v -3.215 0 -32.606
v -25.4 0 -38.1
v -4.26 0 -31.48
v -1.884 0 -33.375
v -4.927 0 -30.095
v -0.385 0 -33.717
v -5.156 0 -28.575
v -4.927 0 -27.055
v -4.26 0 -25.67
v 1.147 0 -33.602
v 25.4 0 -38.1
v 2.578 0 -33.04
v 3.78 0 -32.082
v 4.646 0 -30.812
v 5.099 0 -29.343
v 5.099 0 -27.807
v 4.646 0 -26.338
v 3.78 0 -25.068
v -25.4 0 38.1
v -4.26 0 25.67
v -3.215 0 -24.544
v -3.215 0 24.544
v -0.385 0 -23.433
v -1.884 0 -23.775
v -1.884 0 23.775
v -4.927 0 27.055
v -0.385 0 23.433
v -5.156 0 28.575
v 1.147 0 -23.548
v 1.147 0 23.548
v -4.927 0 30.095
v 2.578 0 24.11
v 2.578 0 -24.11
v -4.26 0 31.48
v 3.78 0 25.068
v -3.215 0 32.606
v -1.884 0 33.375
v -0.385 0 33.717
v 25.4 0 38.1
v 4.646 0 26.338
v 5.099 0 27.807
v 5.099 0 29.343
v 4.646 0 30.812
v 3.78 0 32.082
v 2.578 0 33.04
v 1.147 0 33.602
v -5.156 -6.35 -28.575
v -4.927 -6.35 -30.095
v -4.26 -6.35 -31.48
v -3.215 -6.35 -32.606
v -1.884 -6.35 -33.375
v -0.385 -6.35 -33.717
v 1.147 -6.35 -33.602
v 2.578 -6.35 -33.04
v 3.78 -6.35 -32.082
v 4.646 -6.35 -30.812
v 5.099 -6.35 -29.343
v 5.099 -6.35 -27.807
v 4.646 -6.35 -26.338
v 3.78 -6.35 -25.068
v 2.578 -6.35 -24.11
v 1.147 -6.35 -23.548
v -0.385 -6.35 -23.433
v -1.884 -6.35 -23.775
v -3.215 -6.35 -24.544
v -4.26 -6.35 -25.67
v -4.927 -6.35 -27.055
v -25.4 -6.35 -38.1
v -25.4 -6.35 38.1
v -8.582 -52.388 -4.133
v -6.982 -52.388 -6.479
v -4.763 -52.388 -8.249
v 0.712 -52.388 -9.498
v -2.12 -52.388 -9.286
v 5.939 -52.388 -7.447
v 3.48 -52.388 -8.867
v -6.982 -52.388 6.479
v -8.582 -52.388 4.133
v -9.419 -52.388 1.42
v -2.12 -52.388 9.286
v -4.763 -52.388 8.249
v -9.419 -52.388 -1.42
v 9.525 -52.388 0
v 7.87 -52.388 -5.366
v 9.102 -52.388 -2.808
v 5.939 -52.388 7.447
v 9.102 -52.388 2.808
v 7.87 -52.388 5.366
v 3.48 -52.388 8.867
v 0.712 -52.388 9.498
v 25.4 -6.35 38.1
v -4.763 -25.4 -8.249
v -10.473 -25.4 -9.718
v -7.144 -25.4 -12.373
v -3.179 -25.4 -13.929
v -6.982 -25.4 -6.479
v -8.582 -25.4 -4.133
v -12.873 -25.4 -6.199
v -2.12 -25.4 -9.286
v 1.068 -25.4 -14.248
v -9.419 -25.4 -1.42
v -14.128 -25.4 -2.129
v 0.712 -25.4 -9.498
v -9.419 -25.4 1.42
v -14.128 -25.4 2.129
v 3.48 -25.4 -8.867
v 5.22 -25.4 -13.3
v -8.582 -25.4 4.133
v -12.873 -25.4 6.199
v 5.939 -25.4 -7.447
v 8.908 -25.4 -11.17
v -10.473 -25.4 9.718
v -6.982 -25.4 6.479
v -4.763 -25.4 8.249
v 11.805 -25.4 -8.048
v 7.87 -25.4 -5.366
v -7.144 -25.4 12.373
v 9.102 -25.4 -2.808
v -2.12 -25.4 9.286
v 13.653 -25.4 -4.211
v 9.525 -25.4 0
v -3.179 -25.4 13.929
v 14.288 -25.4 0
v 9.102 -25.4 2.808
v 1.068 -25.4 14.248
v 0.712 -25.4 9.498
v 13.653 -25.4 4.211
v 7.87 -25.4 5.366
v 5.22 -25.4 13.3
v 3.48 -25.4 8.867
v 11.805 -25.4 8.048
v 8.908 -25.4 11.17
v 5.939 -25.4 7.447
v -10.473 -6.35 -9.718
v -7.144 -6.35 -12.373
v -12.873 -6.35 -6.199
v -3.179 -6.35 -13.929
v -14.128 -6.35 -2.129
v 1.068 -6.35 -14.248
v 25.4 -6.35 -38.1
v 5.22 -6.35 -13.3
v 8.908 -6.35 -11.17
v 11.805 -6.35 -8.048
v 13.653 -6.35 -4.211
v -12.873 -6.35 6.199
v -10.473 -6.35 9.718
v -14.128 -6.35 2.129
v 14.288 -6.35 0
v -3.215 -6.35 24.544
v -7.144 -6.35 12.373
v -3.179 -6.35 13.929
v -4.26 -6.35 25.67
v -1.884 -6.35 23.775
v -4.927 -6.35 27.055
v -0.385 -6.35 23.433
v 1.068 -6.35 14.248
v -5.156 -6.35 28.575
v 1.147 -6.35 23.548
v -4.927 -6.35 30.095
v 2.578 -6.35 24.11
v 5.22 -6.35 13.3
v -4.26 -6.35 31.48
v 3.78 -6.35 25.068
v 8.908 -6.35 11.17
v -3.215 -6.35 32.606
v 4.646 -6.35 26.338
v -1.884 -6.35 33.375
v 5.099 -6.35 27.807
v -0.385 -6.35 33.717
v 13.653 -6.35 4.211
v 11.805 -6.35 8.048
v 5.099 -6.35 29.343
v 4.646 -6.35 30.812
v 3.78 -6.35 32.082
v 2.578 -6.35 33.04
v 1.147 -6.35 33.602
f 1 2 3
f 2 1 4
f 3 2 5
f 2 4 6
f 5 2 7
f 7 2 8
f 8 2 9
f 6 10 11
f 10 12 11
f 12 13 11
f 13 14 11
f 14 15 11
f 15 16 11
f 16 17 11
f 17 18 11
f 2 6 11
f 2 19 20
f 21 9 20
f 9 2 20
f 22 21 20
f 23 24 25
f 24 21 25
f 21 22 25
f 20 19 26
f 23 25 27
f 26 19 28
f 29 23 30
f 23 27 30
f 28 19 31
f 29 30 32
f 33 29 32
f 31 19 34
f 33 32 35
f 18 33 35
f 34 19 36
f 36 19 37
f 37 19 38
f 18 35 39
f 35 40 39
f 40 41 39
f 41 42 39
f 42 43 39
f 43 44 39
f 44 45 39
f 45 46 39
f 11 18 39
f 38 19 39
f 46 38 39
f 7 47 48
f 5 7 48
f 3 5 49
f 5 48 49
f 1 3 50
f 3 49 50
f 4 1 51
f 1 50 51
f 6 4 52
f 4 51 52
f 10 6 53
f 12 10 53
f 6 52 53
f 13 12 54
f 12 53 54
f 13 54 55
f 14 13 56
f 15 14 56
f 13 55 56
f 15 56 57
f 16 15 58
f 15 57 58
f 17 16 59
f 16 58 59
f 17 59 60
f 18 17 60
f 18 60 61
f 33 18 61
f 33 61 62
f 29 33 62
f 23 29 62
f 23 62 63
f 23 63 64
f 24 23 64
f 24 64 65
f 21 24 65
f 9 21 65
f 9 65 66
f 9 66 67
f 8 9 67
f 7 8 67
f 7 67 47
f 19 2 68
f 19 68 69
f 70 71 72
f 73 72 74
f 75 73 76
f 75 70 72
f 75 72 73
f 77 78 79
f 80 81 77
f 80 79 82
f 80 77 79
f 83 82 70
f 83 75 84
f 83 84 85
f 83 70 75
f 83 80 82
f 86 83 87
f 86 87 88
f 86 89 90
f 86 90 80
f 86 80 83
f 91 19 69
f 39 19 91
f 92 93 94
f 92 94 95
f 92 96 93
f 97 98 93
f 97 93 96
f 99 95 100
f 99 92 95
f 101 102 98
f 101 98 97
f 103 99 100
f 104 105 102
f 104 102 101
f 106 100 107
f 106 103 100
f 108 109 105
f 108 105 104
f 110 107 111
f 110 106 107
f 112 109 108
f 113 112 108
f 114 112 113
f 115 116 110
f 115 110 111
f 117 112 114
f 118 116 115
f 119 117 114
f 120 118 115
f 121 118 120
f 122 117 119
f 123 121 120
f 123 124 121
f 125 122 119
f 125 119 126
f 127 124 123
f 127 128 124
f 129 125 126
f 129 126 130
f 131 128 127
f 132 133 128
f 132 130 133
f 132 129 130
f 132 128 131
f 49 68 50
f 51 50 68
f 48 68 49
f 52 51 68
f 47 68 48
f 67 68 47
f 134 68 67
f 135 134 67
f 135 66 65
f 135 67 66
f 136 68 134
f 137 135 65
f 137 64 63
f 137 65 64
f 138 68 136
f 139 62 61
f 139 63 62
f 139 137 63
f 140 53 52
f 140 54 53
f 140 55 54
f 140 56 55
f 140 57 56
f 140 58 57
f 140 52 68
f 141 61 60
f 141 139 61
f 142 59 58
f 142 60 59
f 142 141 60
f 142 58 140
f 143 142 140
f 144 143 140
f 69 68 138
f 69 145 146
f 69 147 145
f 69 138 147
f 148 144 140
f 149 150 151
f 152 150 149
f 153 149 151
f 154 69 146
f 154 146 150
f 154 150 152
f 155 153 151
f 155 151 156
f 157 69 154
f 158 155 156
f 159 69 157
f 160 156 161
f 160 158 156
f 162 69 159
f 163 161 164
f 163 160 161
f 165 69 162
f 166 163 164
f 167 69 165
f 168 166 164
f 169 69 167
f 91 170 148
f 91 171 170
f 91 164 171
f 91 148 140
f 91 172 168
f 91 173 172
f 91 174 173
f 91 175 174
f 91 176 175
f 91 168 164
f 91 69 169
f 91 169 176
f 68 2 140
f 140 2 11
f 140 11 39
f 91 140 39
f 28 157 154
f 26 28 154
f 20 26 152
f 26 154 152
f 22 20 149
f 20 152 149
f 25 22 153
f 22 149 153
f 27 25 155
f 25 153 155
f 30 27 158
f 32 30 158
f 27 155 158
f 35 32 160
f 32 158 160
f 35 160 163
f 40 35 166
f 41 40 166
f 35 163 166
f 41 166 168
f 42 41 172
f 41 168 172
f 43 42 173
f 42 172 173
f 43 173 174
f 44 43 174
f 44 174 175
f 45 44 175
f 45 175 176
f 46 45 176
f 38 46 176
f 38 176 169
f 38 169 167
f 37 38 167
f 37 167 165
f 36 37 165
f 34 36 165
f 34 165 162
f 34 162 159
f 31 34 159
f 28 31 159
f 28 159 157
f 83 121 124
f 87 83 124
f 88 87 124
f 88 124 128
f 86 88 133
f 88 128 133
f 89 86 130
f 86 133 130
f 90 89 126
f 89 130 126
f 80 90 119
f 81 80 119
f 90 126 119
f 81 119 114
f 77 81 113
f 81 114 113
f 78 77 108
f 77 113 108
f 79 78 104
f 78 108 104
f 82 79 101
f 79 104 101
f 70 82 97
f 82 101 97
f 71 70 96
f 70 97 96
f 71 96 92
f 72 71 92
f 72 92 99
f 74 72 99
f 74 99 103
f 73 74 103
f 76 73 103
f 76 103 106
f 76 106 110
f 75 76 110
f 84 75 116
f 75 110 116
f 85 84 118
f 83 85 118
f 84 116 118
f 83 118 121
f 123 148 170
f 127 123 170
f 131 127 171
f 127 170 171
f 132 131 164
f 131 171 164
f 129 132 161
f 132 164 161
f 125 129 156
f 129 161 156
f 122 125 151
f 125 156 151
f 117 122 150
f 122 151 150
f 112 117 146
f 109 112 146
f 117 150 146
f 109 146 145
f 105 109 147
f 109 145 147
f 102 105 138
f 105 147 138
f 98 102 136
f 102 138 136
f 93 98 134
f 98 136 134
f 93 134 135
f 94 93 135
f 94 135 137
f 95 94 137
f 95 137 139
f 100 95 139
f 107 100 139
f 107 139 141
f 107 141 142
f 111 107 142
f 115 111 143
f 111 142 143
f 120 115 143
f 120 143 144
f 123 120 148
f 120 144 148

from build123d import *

# Parameters (mm, degrees)
F0_W     = 50.8
F0_H     = 76.2
F1_DEPTH = 6.35
F2_D     = 10.3124
F3_R     = 14.2875
F4_DEPTH = 19.05
F5_R     = 9.525
F6_DEPTH = 26.9875


with BuildPart() as f1:
    # F0 (on Front) → F1 (new body)
    with BuildSketch(Plane.XZ):
        Rectangle(F0_W, F0_H)
    extrude(amount=F1_DEPTH)

    # F2 (through all)
    with Locations(Plane(origin=(0, 0, 0), x_dir=(1, 0, 0), z_dir=(0, 1, 0))):
        with Locations((0, -28.575), (0, 28.575)):
            Hole(F2_D / 2)

    # F3 (on face) → F4 (join)
    with BuildSketch(Plane.XZ.offset(6.35)):
        Circle(F3_R)
    extrude(amount=F4_DEPTH)

    # F5 (on face) → F6 (join)
    with BuildSketch(Plane.XZ.offset(25.4)):
        Circle(F5_R)
    extrude(amount=F6_DEPTH)


solid = f1.part
